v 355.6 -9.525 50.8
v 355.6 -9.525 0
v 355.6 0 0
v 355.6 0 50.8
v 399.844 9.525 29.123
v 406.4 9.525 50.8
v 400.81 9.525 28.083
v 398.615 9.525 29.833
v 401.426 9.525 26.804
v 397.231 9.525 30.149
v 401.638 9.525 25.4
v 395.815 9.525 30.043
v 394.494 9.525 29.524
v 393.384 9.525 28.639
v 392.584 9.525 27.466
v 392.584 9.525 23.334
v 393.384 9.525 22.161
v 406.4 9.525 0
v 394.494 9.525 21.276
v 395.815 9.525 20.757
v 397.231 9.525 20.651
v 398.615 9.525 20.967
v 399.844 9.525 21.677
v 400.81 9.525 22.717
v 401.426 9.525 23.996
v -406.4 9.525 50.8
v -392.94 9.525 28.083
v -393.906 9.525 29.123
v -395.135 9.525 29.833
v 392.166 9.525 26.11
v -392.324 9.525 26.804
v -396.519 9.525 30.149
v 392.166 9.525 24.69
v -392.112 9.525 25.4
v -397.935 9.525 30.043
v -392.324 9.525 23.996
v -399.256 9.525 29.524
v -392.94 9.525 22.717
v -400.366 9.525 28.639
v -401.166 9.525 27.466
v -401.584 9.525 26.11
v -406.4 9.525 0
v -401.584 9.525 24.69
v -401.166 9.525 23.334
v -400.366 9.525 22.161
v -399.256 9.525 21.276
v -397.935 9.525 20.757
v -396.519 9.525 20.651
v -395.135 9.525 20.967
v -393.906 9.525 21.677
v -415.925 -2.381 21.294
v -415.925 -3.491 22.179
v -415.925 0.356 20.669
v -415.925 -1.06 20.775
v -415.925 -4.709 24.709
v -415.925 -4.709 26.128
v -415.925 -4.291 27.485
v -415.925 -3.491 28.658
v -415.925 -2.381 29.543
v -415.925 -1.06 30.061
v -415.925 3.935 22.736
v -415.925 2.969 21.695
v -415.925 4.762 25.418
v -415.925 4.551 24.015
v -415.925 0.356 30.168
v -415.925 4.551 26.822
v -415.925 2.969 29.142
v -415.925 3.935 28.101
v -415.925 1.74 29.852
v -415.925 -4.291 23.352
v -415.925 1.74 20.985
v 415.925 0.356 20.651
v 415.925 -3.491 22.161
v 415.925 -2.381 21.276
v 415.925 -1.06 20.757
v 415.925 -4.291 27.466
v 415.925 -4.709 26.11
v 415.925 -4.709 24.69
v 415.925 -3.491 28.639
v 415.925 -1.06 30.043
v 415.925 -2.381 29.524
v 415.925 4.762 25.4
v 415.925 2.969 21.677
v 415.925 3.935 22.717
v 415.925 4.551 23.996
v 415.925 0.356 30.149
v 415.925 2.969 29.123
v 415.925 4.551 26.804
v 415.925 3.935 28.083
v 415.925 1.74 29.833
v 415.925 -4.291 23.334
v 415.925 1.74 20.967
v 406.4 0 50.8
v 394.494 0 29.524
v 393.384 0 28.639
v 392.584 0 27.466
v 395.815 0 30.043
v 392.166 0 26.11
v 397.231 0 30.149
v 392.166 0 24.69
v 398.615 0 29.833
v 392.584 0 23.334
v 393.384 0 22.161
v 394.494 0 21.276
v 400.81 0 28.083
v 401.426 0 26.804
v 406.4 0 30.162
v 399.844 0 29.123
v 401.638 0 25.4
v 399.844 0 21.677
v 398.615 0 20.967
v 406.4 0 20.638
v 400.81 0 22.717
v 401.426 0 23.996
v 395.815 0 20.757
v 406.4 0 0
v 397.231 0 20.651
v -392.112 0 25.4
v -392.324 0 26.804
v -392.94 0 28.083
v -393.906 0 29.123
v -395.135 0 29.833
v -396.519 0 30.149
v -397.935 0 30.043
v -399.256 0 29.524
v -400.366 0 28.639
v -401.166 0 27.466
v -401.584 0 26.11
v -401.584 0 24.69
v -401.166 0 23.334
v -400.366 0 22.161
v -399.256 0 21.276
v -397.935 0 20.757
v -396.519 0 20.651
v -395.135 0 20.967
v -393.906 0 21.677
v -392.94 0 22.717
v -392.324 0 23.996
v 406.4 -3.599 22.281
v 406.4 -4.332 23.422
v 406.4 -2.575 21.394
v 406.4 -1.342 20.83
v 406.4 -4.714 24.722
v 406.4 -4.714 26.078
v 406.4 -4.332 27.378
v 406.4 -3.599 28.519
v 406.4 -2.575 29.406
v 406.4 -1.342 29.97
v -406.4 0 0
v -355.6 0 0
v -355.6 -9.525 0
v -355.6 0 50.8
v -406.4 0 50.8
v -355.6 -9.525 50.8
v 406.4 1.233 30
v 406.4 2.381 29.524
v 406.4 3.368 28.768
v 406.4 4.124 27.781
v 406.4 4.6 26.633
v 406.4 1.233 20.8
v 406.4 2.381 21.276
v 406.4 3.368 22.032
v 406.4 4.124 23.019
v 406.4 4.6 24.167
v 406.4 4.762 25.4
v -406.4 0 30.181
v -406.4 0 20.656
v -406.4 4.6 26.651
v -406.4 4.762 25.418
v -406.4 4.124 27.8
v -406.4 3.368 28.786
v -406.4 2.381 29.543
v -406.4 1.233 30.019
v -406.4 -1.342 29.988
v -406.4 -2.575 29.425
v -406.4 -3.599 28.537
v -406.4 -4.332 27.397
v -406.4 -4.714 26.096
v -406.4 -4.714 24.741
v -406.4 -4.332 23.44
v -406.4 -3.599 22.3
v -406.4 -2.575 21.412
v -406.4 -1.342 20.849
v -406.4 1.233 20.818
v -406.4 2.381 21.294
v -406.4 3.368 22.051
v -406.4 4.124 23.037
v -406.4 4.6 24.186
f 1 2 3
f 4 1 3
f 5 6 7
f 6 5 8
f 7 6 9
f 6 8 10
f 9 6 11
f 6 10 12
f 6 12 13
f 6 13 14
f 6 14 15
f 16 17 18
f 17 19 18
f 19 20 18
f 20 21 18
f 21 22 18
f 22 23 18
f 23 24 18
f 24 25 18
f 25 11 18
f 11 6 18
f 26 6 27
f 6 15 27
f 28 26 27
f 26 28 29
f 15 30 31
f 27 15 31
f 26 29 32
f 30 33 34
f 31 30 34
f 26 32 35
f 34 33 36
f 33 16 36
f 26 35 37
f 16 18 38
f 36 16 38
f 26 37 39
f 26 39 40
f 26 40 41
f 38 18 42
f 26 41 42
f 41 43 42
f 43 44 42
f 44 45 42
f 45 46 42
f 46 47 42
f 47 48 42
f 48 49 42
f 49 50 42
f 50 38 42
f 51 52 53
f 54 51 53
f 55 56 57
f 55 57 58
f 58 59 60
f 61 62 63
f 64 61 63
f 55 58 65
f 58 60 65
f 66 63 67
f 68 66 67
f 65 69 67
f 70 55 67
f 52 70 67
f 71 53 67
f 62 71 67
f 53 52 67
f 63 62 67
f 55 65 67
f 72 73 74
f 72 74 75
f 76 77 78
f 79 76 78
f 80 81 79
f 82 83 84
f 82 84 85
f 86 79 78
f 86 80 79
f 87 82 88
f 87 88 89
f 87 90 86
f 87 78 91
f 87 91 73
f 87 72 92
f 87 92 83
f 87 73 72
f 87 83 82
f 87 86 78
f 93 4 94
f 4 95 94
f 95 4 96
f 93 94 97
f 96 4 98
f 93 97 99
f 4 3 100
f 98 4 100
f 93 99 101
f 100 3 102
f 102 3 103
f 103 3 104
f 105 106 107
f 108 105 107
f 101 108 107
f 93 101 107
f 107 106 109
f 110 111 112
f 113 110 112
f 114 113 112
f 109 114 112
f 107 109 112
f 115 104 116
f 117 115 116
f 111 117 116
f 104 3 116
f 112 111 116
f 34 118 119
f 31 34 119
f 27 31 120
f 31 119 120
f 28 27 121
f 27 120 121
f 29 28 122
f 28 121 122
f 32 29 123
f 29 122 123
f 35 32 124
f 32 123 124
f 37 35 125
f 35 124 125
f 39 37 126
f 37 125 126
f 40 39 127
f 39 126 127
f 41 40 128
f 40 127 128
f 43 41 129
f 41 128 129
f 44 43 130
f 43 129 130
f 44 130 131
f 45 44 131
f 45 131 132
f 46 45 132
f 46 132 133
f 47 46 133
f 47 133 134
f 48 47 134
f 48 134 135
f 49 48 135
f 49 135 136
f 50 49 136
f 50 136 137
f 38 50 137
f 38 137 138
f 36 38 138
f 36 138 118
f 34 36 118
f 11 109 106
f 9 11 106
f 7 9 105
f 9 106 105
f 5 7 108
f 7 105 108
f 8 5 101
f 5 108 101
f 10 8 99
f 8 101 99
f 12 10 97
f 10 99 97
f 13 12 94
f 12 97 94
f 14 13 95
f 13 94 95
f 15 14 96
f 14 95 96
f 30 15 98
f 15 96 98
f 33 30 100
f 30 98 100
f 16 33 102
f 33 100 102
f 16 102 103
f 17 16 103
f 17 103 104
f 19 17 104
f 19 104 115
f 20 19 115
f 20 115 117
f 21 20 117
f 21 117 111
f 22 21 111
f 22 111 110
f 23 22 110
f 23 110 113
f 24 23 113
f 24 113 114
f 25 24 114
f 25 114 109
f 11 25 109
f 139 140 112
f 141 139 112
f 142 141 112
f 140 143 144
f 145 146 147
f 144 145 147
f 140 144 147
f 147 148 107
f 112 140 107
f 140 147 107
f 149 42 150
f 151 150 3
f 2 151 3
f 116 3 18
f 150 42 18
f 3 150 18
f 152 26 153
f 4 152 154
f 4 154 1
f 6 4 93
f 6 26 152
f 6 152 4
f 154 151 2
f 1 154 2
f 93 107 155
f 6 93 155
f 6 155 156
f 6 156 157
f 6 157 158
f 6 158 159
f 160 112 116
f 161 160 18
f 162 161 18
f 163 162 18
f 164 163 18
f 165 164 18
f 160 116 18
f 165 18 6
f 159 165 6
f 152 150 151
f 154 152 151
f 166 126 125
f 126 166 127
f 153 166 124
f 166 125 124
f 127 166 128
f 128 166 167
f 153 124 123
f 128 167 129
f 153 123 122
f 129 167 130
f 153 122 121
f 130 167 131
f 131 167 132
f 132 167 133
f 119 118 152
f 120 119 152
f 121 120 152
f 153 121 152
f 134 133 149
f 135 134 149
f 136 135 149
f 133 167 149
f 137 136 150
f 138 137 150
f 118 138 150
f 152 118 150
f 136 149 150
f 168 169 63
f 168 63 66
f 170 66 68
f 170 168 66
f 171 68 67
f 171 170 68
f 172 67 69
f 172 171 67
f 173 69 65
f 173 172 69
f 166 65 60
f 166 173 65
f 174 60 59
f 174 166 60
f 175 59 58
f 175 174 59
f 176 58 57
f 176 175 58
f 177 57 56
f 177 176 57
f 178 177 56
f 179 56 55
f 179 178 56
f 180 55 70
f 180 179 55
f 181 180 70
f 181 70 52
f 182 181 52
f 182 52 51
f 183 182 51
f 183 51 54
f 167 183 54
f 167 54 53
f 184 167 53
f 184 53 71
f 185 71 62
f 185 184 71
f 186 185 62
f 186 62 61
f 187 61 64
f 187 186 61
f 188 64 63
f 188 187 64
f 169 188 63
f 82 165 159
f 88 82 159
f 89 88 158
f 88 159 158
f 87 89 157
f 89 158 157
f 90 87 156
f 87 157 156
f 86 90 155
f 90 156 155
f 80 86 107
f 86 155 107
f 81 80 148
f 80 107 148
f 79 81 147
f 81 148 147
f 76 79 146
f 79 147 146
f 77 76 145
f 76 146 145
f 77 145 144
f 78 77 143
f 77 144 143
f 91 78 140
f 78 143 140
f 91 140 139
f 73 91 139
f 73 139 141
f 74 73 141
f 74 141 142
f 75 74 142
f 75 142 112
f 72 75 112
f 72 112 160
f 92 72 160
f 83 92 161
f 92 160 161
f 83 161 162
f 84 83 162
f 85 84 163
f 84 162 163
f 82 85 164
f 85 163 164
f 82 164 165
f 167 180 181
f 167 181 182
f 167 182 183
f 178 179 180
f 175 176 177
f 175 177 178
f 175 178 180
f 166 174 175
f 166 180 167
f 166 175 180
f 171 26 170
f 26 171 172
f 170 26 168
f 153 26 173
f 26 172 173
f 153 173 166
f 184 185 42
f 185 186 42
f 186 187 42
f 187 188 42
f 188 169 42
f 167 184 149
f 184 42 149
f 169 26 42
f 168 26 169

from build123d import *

# Parameters (mm, degrees)
F1_DEPTH = 50.8
F3_R     = 4.7625
F4_DEPTH = 9.525
F6_R     = 4.7625
F7_DEPTH = 9.525
F8_R     = 4.7625
F9_DEPTH = 25.4


with BuildPart() as f1:
    # F0 (on Top) → F1 (new body)
    with BuildSketch(Plane.XY):
        Polygon((-355.6, 0), (-355.6, -9.525), (355.6, -9.525), (355.6, 0), (406.4, 0), (406.4, 9.525), (-406.4, 9.525), (-406.4, 0), align=None)
    extrude(amount=F1_DEPTH)

    # F3 (on offset) → F4 (join)
    with BuildSketch(Plane.YZ.offset(406.4)):
        with Locations((0, 25.4)):
            Circle(F3_R)
    extrude(amount=F4_DEPTH)

    # F6 (on offset) → F7 (join)
    with BuildSketch(Plane.YZ.offset(-406.4)):
        with Locations((0, 25.418339)):
            Circle(F6_R)
    extrude(amount=-F7_DEPTH)

    # F8 (on Front) → F9 (cut)
    with BuildSketch(Plane.XZ):
        with Locations((-396.875, 25.4)):
            Circle(F8_R)
        with Locations((396.875, 25.4)):
            Circle(F8_R)
    extrude(amount=-F9_DEPTH, mode=Mode.SUBTRACT)


solid = f1.part
